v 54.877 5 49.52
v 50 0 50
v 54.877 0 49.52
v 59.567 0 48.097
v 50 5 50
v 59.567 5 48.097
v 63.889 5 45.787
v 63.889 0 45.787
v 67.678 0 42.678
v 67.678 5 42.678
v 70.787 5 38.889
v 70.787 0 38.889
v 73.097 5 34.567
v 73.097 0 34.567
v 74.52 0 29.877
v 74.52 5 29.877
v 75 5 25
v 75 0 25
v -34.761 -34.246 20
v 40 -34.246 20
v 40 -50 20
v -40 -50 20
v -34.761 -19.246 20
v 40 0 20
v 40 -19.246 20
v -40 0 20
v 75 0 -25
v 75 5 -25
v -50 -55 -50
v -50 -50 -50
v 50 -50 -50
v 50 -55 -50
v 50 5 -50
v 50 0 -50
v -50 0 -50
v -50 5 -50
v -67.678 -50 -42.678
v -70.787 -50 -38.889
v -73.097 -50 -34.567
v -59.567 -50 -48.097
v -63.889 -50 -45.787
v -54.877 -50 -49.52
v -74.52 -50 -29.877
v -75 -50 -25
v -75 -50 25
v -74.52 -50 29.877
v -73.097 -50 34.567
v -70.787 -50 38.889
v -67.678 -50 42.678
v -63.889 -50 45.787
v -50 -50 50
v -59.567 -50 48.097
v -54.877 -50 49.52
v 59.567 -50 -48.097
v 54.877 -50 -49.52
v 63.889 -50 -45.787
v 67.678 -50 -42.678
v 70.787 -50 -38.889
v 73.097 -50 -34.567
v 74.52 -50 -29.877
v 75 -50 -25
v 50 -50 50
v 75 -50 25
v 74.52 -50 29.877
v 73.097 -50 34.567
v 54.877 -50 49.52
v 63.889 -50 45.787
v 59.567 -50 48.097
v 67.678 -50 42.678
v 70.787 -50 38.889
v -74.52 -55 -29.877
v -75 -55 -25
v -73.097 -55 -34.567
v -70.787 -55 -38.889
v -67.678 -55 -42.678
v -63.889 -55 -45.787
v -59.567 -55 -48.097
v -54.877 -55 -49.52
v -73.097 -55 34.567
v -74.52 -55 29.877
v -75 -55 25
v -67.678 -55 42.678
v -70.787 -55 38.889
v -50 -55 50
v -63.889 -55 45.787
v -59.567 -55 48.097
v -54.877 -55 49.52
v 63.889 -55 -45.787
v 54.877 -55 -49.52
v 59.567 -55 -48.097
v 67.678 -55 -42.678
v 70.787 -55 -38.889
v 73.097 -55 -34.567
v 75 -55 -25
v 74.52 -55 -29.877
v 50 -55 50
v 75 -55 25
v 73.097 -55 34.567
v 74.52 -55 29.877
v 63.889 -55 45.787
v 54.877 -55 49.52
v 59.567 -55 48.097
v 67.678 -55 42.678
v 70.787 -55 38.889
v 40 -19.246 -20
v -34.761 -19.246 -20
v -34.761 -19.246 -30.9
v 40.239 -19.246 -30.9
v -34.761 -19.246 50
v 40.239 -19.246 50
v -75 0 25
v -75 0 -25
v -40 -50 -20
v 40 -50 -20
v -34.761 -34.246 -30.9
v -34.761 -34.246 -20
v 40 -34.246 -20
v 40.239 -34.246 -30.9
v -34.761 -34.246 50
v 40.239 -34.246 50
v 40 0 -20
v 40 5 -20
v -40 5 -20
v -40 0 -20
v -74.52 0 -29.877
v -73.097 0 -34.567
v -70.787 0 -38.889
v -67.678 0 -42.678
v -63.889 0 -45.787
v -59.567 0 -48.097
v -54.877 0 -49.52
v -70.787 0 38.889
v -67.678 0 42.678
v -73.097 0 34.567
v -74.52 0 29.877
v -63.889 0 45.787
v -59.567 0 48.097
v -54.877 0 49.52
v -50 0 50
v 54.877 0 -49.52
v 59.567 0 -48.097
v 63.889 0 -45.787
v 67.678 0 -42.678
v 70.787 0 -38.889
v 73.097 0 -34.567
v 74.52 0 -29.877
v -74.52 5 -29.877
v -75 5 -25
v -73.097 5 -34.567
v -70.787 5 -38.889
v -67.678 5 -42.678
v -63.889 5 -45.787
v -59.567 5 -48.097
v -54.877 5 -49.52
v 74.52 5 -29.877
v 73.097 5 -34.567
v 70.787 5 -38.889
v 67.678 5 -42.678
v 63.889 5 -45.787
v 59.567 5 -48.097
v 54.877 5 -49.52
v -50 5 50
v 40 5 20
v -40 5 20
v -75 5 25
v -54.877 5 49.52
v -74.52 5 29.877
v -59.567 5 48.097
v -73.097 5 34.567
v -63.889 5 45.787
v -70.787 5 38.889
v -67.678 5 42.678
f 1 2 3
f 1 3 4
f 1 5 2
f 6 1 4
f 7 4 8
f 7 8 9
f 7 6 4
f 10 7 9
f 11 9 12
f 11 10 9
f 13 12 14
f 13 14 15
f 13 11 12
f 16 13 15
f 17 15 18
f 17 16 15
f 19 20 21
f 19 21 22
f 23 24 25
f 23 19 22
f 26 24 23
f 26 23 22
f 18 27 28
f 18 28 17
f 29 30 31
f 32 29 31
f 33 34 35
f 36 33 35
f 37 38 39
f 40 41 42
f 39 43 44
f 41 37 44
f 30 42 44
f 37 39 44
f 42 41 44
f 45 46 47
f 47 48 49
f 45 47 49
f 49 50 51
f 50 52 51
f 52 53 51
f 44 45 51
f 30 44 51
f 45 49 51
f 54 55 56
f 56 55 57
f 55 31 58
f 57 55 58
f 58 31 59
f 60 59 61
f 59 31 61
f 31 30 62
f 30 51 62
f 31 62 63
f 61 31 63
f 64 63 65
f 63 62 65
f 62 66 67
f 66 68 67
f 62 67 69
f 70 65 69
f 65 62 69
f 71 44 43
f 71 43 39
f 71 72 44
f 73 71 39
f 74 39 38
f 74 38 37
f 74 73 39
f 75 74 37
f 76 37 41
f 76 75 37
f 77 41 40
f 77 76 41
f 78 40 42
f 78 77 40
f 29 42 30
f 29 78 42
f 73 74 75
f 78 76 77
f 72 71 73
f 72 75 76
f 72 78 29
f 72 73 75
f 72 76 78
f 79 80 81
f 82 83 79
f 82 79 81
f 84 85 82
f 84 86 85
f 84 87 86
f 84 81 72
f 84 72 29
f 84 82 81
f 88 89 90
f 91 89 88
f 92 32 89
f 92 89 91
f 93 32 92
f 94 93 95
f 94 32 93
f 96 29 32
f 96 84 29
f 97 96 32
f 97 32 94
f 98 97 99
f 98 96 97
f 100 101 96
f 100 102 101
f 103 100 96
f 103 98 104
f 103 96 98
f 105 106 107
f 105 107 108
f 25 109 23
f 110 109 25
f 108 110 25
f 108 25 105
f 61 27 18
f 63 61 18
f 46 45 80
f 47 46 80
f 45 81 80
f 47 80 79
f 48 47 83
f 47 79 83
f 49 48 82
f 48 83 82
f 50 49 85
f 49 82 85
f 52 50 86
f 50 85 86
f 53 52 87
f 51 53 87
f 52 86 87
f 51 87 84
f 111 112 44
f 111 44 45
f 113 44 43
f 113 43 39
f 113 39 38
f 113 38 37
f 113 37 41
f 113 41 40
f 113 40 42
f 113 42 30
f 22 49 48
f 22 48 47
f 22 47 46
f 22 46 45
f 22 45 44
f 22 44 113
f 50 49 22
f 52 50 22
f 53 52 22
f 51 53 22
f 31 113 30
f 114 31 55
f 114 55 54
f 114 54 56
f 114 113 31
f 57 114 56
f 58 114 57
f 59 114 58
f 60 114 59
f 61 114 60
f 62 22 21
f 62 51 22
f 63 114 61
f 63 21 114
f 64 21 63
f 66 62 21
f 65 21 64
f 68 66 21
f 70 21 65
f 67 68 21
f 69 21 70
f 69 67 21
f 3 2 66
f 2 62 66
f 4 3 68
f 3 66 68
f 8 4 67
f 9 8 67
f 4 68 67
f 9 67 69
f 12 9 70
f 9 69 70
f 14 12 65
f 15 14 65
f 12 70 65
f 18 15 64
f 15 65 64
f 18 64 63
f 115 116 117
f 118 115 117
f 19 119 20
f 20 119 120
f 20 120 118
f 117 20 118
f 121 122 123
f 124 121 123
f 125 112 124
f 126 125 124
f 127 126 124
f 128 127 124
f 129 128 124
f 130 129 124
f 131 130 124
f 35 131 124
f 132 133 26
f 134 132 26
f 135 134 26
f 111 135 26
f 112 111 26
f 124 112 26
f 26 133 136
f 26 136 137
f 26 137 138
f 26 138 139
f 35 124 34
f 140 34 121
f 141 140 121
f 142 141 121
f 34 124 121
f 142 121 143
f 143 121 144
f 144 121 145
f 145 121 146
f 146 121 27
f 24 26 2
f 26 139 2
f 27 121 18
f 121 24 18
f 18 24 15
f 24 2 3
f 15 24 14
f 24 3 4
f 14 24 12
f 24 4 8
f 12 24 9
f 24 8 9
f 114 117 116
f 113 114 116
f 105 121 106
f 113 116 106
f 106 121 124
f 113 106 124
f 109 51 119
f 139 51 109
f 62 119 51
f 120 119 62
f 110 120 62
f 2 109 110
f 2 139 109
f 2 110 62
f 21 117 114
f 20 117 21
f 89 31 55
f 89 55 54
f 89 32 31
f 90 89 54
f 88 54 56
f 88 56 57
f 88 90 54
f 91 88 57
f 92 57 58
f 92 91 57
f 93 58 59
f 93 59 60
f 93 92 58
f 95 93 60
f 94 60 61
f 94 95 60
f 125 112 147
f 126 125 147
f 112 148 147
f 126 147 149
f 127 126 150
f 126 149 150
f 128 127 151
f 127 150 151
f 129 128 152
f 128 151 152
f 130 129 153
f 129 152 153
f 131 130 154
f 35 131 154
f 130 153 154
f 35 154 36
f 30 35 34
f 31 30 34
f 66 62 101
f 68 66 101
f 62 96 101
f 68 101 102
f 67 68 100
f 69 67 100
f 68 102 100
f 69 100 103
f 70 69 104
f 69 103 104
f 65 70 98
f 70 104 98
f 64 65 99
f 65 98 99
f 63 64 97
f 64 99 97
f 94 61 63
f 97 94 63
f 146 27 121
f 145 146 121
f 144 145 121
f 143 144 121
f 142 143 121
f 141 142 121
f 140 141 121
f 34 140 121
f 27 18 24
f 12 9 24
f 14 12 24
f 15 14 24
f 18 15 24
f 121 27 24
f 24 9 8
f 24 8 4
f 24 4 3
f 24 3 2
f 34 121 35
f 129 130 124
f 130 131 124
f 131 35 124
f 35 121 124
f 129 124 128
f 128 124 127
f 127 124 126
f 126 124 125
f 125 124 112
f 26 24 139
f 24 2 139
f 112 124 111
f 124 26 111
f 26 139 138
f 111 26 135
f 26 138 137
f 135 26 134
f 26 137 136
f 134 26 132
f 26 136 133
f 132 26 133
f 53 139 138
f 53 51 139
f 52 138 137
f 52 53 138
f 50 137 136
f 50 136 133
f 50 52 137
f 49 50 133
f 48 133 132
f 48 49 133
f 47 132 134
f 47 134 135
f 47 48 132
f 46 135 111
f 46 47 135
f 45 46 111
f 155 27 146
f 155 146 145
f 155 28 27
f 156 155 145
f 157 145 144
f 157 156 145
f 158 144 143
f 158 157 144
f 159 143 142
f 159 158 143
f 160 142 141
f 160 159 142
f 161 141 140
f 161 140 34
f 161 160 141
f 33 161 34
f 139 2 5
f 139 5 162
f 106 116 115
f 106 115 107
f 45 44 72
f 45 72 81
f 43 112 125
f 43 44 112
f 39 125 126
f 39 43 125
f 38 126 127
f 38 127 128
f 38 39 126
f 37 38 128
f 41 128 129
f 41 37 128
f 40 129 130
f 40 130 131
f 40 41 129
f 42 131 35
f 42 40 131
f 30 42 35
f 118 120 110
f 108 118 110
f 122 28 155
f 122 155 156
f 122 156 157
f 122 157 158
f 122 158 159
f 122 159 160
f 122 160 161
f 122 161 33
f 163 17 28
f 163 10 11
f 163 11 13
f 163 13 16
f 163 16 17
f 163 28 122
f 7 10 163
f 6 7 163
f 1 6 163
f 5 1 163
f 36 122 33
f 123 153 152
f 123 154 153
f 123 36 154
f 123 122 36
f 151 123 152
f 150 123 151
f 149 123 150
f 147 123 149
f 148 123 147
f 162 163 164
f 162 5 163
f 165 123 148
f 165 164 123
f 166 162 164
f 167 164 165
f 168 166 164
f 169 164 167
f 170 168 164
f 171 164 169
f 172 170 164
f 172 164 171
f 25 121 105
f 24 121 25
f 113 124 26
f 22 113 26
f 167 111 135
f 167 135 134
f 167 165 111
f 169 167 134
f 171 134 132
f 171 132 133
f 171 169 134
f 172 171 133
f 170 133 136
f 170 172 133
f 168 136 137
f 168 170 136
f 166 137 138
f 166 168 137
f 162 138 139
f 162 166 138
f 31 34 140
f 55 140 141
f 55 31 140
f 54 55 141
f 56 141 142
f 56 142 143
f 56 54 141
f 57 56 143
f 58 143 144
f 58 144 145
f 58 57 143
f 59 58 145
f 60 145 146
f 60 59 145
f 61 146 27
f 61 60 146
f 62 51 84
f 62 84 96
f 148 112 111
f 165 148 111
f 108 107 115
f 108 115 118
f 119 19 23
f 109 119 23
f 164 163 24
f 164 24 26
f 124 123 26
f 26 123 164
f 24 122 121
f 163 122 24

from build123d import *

# Parameters (mm, degrees)
F0_W      = 150
F0_H      = 100
F1_DEPTH  = 50
F2_DEPTH  = 5
F3_W      = 80
F3_H      = 40
F4_DEPTH  = 100
F5_W      = 150
F5_H      = 100
F6_DEPTH  = 5
F8_R      = 25
F9_R      = 25
F10_R     = 25
F11_R     = 25
F12_R     = 25
F13_R     = 25
F14_R     = 25
F15_R     = 25
F16_R     = 25
F17_R     = 25
F18_R     = 25
F19_R     = 25
F20_W     = 80
F20_H     = 40
F21_DEPTH = 100
F22_W     = 75
F22_H     = 15
F23_DEPTH = 80.9


with BuildPart() as f1:
    # F0 (on Front) → F1 (new body)
    with BuildSketch(Plane.XZ):
        Rectangle(F0_W, F0_H)
    extrude(amount=F1_DEPTH)


with BuildPart() as f2:
    # F2 (new): a face of the model
    f2_faces = [f1.part.faces().sort_by_distance(p)[0] for p in [
        (0, -50, 0),
    ]]
    extrude(f2_faces, amount=F2_DEPTH)

    # F12
    f12_edges = [f2.edges().sort_by_distance(p)[0] for p in [
        (-75, -52.5, 50),
    ]]
    fillet(f12_edges, radius=F12_R)

    # F13
    f13_edges = [f2.edges().sort_by_distance(p)[0] for p in [
        (75, -52.5, 50),
    ]]
    fillet(f13_edges, radius=F13_R)

    # F14
    f14_edges = [f2.edges().sort_by_distance(p)[0] for p in [
        (-75, -52.5, -50),
    ]]
    fillet(f14_edges, radius=F14_R)

    # F15
    f15_edges = [f2.edges().sort_by_distance(p)[0] for p in [
        (75, -52.5, -50),
    ]]
    fillet(f15_edges, radius=F15_R)


with BuildPart() as f1_1:
    add(f1.part)

    # F3 (on face) → F4 (cut)
    with BuildSketch(Plane(origin=(0, 0, 0), x_dir=(-1, 0, 0), z_dir=(0, 1, 0))):
        Rectangle(F3_W, F3_H)
    extrude(amount=-F4_DEPTH, mode=Mode.SUBTRACT)

    # F8
    f8_edges = [f1_1.edges().sort_by_distance(p)[0] for p in [
        (75, -25, 50),
    ]]
    fillet(f8_edges, radius=F8_R)

    # F9
    f9_edges = [f1_1.edges().sort_by_distance(p)[0] for p in [
        (-75, -25, 50),
    ]]
    fillet(f9_edges, radius=F9_R)

    # F10
    f10_edges = [f1_1.edges().sort_by_distance(p)[0] for p in [
        (-75, -25, -50),
    ]]
    fillet(f10_edges, radius=F10_R)

    # F11
    f11_edges = [f1_1.edges().sort_by_distance(p)[0] for p in [
        (75, -25, -50),
    ]]
    fillet(f11_edges, radius=F11_R)

    # F22 (on face) → F23 (cut)
    with BuildSketch(Plane.XY.offset(50)):
        with Locations((2.7394670993, -26.7461243272)):
            Rectangle(F22_W, F22_H)
    extrude(amount=-F23_DEPTH, mode=Mode.SUBTRACT)


with BuildPart() as f6:
    # F5 (on face) → F6 (new body)
    with BuildSketch(Plane(origin=(0, 0, 0), x_dir=(-1, 0, 0), z_dir=(0, 1, 0))):
        Rectangle(F5_W, F5_H)
    extrude(amount=F6_DEPTH)

    # F16
    f16_edges = [f6.edges().sort_by_distance(p)[0] for p in [
        (-75, 2.5, 50),
    ]]
    fillet(f16_edges, radius=F16_R)

    # F17
    f17_edges = [f6.edges().sort_by_distance(p)[0] for p in [
        (-75, 2.5, -50),
    ]]
    fillet(f17_edges, radius=F17_R)

    # F18
    f18_edges = [f6.edges().sort_by_distance(p)[0] for p in [
        (75, 2.5, 50),
    ]]
    fillet(f18_edges, radius=F18_R)

    # F19
    f19_edges = [f6.edges().sort_by_distance(p)[0] for p in [
        (75, 2.5, -50),
    ]]
    fillet(f19_edges, radius=F19_R)

    # F20 (on face) → F21 (cut)
    with BuildSketch(Plane(origin=(0, 5, 0), x_dir=(-1, 0, 0), z_dir=(0, 1, 0))):
        Rectangle(F20_W, F20_H)
    extrude(amount=-F21_DEPTH, mode=Mode.SUBTRACT)


solid = Compound([f2.part, f1_1.part, f6.part])
